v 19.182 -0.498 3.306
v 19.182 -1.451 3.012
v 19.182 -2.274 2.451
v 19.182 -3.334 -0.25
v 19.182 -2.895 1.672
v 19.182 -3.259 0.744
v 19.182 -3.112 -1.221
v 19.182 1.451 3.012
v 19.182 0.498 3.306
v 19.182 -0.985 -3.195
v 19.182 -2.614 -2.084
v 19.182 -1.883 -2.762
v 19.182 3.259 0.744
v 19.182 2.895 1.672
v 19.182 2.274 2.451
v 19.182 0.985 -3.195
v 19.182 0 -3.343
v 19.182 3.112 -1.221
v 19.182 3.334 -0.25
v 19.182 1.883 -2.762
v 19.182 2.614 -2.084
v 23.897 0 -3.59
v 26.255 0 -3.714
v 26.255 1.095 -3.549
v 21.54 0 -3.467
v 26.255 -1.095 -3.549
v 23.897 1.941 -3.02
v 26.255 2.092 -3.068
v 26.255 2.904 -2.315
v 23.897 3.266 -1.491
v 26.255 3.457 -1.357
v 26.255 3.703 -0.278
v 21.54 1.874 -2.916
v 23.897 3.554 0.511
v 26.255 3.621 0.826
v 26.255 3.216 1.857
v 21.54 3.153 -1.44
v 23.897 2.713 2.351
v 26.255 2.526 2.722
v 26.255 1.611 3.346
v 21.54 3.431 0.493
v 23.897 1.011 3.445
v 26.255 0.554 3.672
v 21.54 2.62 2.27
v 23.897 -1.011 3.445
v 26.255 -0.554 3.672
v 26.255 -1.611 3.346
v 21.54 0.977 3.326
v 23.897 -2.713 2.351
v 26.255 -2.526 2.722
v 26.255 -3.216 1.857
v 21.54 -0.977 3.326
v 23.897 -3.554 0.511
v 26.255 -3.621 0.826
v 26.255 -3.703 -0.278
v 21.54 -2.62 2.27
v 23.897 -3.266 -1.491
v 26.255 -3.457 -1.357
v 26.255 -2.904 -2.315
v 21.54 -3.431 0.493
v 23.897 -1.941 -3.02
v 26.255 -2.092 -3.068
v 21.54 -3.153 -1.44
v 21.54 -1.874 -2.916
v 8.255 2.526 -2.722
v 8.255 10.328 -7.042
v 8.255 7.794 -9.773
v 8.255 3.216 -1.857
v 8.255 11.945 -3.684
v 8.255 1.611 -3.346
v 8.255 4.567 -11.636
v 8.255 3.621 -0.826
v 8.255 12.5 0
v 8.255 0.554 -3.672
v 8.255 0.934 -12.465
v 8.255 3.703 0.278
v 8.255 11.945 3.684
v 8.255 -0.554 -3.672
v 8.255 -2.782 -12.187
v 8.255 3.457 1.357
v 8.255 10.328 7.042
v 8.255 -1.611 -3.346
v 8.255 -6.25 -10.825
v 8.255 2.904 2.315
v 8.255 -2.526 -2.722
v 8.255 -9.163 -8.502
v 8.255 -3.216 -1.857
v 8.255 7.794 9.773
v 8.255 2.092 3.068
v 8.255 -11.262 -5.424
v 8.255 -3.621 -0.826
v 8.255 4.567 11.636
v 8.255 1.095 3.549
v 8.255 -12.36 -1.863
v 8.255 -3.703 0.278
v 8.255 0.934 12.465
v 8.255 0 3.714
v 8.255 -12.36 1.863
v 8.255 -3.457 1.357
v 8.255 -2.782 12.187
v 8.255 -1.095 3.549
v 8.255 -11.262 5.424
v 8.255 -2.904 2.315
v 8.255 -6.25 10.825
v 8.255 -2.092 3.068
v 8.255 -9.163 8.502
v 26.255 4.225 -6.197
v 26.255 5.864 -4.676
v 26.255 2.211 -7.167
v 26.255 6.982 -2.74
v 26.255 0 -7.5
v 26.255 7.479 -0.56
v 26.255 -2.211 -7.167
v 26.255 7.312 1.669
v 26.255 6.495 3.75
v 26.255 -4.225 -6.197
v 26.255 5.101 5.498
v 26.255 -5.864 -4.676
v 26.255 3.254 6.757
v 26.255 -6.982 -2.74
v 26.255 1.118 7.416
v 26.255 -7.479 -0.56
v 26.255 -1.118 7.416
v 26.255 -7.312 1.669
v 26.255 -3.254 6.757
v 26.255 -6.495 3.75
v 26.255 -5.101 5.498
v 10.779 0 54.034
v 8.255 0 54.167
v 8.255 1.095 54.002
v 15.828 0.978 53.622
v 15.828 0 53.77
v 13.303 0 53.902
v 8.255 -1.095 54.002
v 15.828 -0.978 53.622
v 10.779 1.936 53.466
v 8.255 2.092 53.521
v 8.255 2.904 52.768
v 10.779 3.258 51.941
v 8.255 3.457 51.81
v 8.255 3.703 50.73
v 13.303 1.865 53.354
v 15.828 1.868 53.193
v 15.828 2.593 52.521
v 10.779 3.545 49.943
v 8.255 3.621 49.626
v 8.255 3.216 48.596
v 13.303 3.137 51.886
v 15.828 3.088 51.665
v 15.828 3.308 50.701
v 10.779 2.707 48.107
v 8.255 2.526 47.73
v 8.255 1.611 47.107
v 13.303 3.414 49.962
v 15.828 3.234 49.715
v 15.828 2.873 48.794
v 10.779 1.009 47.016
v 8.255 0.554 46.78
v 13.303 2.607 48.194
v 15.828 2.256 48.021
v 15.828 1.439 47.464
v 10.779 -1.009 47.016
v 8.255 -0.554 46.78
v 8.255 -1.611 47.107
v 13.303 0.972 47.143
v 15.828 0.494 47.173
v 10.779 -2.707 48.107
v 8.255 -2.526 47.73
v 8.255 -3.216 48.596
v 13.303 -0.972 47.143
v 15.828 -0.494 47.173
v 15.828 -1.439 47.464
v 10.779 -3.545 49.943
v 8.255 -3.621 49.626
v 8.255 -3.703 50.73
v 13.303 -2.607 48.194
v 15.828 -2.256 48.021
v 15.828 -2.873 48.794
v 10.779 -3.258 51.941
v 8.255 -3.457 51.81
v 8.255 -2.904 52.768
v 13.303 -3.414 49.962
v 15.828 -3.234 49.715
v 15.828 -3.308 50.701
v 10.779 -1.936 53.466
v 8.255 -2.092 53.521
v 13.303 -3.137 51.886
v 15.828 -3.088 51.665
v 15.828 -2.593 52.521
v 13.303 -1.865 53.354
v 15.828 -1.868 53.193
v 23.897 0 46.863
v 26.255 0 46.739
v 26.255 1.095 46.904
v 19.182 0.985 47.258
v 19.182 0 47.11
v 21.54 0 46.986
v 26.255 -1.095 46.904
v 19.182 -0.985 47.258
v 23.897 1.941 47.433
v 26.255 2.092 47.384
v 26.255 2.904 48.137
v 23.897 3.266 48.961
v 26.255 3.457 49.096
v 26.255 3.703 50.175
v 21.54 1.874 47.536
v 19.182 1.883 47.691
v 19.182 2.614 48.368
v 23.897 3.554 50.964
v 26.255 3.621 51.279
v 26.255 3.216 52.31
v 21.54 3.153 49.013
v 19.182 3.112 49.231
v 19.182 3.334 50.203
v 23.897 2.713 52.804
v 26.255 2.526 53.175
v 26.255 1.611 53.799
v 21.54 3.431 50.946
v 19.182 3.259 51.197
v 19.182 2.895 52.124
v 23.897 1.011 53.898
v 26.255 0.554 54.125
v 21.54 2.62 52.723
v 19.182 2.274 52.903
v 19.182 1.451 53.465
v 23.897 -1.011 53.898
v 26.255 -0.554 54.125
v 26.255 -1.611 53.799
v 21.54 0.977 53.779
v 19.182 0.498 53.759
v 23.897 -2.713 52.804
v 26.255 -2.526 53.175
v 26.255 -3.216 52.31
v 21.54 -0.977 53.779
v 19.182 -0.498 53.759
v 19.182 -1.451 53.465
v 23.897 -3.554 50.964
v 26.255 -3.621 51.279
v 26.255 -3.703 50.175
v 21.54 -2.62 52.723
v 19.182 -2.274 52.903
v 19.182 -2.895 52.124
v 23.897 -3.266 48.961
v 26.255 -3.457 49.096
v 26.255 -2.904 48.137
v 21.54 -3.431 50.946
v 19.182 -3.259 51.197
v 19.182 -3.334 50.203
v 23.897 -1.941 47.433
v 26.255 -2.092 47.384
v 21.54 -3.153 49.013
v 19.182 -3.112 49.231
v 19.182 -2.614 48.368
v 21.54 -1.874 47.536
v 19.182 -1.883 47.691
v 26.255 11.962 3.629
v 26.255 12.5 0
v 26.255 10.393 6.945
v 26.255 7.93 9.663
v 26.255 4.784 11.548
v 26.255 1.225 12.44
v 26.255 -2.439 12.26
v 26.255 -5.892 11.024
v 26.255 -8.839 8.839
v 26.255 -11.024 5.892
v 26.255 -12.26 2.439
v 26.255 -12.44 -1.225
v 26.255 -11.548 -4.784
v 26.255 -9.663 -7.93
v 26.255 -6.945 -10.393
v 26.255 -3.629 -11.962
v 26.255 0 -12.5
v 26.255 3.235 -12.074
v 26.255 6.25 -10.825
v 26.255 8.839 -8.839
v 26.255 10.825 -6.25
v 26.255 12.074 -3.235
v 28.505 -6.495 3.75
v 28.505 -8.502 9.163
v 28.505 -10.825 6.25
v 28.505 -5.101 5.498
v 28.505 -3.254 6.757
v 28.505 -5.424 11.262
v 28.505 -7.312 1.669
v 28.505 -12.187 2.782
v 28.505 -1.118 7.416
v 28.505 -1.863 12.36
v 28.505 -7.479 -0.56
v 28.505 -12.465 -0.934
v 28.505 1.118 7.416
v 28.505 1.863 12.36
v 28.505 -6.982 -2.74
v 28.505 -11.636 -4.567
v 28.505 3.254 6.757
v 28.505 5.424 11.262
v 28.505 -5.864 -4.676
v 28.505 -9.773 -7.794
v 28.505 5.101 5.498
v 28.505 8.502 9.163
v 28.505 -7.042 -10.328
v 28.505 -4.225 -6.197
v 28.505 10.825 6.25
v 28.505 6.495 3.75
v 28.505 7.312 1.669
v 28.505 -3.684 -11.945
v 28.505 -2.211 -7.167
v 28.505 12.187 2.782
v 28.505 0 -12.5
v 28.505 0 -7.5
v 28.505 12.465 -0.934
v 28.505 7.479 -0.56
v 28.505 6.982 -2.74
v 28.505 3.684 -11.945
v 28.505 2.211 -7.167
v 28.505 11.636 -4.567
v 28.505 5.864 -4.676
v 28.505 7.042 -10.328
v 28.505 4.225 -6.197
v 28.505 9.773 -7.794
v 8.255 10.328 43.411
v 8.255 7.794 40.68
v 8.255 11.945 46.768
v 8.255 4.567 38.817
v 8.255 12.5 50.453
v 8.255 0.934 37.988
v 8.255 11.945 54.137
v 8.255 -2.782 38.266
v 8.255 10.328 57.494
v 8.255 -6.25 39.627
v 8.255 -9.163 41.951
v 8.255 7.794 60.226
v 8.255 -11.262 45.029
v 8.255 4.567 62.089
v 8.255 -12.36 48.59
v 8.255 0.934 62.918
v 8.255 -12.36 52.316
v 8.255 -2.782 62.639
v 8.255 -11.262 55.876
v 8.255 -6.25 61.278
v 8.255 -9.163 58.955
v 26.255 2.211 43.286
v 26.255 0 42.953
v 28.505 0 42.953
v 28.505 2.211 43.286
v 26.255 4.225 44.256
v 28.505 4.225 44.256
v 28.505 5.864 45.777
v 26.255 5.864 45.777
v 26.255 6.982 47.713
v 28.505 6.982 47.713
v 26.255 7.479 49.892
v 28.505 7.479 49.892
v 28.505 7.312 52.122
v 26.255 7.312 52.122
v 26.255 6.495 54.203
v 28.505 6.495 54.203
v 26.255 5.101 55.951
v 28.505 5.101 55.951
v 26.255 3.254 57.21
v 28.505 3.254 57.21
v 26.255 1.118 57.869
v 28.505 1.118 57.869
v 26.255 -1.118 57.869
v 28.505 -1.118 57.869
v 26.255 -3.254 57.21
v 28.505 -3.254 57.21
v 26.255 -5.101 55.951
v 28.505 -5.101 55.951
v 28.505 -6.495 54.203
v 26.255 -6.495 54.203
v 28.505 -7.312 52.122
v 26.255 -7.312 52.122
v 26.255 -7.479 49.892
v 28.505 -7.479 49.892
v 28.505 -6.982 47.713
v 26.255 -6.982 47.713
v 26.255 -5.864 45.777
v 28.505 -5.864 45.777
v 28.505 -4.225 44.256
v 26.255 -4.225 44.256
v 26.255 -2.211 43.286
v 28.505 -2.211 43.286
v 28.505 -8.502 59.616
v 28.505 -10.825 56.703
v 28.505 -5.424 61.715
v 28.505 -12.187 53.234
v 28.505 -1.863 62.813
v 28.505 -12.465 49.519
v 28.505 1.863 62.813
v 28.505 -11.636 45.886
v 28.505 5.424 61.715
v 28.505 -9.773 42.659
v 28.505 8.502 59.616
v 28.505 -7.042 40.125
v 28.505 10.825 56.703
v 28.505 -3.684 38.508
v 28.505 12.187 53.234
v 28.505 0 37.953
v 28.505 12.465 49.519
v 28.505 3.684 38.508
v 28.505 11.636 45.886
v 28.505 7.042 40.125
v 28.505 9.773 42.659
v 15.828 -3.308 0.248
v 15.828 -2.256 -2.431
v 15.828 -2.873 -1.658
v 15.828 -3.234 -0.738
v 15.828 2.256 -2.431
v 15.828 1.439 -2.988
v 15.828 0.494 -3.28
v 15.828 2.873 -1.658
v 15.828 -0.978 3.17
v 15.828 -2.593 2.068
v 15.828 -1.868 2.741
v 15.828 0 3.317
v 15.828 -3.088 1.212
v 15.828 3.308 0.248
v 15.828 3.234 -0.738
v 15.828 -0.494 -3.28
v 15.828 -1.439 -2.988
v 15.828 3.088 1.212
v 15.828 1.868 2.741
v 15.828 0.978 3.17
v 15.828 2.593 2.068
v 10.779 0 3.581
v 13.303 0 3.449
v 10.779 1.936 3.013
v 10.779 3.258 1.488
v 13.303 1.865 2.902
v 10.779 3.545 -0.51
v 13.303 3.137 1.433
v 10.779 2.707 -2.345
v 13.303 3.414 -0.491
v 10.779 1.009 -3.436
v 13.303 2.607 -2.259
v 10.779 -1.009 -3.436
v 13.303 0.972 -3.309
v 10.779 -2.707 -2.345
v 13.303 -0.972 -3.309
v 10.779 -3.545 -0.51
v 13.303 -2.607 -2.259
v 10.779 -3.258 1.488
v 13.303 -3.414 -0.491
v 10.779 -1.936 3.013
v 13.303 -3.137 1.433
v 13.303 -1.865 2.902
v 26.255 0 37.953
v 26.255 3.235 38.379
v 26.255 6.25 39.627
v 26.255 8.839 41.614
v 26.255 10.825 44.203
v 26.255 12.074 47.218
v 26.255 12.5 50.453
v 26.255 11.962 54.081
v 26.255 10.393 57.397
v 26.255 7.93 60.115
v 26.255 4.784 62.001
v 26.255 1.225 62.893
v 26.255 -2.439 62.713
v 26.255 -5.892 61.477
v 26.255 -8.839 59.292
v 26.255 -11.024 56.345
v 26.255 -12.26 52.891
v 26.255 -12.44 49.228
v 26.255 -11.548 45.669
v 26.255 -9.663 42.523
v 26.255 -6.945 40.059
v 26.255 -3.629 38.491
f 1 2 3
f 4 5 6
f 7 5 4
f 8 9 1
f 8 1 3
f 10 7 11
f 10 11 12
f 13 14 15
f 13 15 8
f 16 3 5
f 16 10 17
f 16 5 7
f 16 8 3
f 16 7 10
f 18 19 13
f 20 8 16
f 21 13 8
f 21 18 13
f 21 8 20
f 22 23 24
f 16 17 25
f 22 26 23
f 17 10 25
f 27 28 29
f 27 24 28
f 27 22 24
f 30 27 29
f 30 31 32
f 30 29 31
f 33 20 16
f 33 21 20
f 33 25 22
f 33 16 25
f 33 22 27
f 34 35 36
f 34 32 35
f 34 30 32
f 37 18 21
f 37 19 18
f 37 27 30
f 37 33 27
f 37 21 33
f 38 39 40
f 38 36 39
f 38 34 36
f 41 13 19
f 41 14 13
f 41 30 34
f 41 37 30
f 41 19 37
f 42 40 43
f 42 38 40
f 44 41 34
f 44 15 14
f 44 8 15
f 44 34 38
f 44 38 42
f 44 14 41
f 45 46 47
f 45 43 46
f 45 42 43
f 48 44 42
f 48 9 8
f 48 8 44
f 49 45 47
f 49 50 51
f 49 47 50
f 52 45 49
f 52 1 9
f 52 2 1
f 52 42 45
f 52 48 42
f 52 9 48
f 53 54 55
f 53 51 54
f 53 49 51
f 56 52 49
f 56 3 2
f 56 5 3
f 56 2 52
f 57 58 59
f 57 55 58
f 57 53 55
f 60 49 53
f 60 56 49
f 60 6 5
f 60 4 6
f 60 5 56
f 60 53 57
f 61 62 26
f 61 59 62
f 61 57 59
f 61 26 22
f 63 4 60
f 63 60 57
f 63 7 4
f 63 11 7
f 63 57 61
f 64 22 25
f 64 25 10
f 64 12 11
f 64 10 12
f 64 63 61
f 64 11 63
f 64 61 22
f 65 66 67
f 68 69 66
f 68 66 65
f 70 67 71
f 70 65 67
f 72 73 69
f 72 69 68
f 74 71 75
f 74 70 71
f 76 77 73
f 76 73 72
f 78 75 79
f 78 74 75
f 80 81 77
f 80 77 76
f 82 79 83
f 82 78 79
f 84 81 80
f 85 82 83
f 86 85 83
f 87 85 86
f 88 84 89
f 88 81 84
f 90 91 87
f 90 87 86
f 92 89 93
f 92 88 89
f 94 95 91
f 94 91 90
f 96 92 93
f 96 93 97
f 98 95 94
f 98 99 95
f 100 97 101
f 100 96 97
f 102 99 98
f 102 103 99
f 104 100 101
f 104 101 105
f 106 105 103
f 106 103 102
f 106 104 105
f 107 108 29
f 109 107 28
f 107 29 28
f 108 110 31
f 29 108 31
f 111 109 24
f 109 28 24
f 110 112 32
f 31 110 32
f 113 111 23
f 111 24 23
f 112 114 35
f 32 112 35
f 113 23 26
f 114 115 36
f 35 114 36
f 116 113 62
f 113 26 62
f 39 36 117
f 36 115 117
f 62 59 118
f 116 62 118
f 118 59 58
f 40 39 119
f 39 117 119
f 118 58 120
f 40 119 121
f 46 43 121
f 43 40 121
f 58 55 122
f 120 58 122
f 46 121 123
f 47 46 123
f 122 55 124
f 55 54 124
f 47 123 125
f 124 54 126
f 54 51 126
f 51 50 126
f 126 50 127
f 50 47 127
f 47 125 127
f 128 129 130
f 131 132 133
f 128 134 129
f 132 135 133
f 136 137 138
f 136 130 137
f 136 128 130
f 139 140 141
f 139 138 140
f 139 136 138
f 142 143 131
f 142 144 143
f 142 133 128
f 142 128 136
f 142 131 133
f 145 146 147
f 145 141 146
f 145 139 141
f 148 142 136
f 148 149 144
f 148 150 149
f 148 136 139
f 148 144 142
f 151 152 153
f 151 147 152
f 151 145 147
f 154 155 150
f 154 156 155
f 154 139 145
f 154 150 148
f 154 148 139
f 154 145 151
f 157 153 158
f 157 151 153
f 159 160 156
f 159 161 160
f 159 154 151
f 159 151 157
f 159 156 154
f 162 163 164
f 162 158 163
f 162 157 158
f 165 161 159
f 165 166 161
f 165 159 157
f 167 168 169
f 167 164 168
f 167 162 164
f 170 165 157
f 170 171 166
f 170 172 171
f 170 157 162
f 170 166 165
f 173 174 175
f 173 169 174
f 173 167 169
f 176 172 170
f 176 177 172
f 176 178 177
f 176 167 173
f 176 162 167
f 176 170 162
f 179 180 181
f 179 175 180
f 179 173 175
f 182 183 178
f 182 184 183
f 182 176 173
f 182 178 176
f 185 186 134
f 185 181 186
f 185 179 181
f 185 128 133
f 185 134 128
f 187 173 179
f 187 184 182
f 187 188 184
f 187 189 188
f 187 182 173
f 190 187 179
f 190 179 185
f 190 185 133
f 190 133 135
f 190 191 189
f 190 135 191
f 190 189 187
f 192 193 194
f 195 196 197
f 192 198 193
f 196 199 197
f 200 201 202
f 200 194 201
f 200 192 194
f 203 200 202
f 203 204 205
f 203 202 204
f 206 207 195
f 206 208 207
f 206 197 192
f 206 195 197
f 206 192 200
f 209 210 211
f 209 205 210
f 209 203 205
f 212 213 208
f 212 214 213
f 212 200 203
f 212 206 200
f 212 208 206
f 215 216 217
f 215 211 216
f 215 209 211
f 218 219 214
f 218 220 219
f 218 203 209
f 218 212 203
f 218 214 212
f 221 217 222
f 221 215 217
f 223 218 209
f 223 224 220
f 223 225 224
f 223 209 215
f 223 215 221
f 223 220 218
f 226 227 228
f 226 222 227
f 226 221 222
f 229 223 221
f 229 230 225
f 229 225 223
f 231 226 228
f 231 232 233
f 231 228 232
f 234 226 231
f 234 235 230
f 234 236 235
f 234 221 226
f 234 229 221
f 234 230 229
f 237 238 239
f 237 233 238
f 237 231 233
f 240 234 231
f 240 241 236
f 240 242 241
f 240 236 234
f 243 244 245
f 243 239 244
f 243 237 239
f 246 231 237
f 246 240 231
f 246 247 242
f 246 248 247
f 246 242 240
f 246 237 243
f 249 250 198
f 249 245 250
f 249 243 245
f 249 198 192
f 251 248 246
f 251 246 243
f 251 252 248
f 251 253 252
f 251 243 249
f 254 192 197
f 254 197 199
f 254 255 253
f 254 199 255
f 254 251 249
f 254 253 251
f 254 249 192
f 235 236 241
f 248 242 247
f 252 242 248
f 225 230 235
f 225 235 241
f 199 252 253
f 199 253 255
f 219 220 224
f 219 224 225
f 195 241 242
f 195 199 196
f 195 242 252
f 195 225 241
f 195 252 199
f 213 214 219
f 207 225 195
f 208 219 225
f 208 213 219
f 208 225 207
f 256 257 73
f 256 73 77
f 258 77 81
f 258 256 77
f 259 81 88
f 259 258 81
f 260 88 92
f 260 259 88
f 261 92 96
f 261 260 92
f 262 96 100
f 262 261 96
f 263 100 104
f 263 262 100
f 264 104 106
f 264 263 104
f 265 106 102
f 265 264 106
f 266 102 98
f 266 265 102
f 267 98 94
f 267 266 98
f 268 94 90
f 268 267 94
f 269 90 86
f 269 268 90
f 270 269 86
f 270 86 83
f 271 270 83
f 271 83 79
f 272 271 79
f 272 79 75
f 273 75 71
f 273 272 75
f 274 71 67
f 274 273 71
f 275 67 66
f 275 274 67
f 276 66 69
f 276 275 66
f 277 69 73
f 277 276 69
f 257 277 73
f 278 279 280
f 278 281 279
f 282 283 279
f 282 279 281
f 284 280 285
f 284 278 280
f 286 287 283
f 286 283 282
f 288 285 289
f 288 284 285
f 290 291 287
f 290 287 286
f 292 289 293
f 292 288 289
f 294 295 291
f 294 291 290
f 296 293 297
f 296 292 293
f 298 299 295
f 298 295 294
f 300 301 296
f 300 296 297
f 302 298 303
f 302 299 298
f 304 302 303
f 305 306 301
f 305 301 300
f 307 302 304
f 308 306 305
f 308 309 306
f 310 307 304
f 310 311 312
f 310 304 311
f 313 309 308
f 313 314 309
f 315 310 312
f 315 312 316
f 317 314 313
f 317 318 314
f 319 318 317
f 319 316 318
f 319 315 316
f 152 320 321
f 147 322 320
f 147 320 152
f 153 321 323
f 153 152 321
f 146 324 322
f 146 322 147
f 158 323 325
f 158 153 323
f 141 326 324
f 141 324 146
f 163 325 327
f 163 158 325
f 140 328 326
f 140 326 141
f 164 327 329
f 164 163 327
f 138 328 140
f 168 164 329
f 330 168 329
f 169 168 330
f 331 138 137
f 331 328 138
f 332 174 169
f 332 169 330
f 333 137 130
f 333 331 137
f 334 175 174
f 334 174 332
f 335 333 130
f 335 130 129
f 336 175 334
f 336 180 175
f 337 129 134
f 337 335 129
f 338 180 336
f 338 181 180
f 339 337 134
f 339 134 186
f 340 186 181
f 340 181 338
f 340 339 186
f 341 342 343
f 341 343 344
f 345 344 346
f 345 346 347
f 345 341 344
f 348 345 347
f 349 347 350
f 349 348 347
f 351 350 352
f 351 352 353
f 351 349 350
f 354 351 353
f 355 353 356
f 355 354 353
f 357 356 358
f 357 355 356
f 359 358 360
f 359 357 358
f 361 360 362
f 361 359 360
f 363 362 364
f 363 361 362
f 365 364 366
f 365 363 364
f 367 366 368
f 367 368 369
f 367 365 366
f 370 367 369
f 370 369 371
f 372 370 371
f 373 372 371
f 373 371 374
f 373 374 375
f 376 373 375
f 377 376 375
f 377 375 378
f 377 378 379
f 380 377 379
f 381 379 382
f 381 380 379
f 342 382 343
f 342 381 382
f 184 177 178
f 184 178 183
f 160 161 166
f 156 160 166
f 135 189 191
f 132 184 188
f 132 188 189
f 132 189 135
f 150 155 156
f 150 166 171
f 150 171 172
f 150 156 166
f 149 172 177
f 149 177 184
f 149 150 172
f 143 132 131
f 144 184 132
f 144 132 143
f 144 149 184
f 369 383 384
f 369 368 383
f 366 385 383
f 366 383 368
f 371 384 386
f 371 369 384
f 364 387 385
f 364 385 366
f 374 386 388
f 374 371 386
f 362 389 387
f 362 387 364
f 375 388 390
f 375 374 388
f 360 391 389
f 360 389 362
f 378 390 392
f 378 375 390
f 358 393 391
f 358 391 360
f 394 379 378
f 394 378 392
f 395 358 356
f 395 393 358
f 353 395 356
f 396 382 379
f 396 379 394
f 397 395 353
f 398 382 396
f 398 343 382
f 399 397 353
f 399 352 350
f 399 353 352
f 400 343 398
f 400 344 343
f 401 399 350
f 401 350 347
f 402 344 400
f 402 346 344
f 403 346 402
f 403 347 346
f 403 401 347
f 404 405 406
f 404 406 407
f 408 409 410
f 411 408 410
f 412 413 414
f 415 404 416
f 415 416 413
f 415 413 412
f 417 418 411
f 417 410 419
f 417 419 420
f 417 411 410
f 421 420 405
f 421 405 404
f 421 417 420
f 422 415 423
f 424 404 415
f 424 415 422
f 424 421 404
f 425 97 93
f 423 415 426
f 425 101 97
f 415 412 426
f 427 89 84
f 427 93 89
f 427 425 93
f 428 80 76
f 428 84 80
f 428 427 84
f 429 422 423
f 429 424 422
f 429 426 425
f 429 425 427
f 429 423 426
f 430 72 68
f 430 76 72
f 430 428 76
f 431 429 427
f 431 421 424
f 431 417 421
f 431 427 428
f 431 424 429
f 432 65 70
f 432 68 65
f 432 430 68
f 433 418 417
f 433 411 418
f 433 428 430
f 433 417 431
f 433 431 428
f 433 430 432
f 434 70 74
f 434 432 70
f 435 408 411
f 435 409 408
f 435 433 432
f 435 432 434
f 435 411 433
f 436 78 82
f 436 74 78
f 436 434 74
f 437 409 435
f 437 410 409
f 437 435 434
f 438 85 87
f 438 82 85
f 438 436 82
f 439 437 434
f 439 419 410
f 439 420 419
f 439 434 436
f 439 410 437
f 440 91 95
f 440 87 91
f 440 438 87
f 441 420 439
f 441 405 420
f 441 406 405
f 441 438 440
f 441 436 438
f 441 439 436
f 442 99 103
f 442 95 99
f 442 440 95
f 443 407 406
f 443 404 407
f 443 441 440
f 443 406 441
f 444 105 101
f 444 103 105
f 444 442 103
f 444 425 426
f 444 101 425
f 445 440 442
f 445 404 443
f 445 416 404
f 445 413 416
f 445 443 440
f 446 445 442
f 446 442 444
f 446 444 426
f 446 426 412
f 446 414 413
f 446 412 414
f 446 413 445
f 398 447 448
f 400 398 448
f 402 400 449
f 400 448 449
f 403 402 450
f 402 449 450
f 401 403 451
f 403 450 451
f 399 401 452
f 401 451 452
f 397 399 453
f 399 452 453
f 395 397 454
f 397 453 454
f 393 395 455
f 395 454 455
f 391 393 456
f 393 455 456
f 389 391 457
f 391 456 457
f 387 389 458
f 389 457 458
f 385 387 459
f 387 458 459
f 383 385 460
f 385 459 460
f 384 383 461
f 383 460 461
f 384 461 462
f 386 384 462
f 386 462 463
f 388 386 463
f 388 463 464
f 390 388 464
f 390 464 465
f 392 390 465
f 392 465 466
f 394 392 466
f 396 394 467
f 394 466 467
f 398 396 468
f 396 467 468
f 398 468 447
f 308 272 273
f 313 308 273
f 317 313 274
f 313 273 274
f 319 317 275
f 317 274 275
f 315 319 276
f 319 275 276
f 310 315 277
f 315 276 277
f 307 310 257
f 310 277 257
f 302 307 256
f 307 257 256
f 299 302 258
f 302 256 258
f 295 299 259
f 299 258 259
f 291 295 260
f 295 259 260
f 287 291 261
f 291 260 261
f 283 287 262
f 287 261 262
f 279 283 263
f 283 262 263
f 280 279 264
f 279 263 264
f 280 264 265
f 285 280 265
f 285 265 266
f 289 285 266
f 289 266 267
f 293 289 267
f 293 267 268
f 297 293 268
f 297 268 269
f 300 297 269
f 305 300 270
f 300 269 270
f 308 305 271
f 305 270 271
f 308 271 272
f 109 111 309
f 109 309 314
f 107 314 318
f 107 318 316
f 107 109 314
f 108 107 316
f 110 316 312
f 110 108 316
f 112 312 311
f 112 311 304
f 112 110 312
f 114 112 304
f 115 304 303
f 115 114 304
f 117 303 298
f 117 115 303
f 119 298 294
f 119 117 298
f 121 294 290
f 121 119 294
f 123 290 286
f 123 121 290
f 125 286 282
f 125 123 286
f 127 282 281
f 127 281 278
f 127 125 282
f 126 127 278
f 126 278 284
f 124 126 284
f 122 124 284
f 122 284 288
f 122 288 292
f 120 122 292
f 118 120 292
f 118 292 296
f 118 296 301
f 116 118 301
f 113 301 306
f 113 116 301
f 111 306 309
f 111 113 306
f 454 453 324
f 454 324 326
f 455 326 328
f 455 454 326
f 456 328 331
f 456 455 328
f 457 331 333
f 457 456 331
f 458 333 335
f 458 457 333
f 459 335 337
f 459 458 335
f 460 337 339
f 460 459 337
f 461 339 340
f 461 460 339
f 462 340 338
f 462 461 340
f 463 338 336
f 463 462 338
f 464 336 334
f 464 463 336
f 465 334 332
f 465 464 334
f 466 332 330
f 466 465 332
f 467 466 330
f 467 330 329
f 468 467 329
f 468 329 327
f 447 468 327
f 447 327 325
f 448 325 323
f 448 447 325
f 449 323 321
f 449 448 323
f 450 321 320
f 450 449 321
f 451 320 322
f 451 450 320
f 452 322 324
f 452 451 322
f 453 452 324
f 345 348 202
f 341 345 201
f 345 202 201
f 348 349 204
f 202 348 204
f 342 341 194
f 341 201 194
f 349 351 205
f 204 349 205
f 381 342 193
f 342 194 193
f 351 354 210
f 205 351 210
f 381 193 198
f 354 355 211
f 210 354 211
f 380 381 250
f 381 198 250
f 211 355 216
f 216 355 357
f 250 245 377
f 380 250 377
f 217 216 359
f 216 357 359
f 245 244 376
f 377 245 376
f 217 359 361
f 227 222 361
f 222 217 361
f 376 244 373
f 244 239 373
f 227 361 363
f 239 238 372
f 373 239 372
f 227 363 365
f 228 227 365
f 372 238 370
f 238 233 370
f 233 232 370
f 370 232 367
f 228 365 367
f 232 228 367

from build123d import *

# Parameters (mm, degrees)
SKETCH1_W           = 18
SKETCH1_H           = 12.5
SKETCH2_R           = 3.71375
CUT_EXTRUDE1_DEPTH  = 7.5725
CUT_EXTRUDE1_TAPER  = 3
SKETCH4_R           = 3.71375
CUT_EXTRUDE2_DEPTH  = 7.0725
CUT_EXTRUDE2_TAPER  = 3
SKETCH5_R           = 12.5
SKETCH5_R_2         = 7.5
BOSS_EXTRUDE1_DEPTH = 2.25


with BuildPart() as part:
    # Sketch1 → Revolve1 (revolve)
    with BuildSketch(Plane.XY):
        with Locations((17.255, 6.25)):
            Rectangle(SKETCH1_W, SKETCH1_H)
    revolve(axis=Axis((8.255, 0, 0), (1, 0, 0)))

    # Sketch2 → Cut-Extrude1 (cut)
    with BuildSketch(Plane.ZY.offset(-8.255)):
        Circle(SKETCH2_R)
    extrude(amount=-CUT_EXTRUDE1_DEPTH, taper=CUT_EXTRUDE1_TAPER, mode=Mode.SUBTRACT)

    # Sketch4 → Cut-Extrude2 (cut)
    with BuildSketch(Plane(origin=(26.255, 0, 0), x_dir=(0, 0, -1), z_dir=(1, 0, 0))):
        Circle(SKETCH4_R)
    extrude(amount=-CUT_EXTRUDE2_DEPTH, taper=CUT_EXTRUDE2_TAPER, mode=Mode.SUBTRACT)


with BuildPart() as body_2:
    # Body-Move/Copy1: copy of part
    add(part.part.moved(Location((0, 0, 50.452769062))))


with BuildPart() as part_1:
    add(part.part)

    # Sketch5 → Boss-Extrude1 (add)
    with BuildSketch(Plane(origin=(26.255, 0, 0), x_dir=(0, 0, -1), z_dir=(1, 0, 0))):
        Circle(SKETCH5_R)
        Circle(SKETCH5_R_2, mode=Mode.SUBTRACT)
        with Locations((-50.452769062, 0)):
            Circle(SKETCH5_R)
        with Locations((-50.452769062, 0)):
            Circle(SKETCH5_R_2, mode=Mode.SUBTRACT)
    extrude(amount=BOSS_EXTRUDE1_DEPTH)


with BuildPart() as body_2_1:
    add(body_2.part)

    # Combine1: union part
    add(part_1.part)


solid = body_2_1.part
